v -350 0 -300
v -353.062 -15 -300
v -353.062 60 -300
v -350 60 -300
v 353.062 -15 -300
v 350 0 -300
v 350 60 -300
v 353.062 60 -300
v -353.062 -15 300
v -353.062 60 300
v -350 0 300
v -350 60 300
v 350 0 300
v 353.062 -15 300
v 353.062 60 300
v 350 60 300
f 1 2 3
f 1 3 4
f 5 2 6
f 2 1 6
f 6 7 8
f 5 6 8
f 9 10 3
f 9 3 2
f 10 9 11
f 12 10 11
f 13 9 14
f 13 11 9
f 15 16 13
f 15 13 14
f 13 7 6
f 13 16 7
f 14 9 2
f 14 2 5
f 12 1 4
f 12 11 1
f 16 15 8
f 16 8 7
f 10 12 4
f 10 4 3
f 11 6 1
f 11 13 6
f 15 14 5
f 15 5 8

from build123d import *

# Parameters (mm, degrees)
SALIENTE_EXTRUIR1_DEPTH = 300


with BuildPart() as part:
    # Croquis1 → Saliente-Extruir1 (new, symmetric)
    with BuildSketch(Plane.XY):
        Polygon((0, -15), (0, 0), (-350, 0), (-350, 60), (-353.0625, 60), (-353.0625, -15), align=None)
        Polygon((350, 60), (350, 0), (0, 0), (0, -15), (353.0625, -15), (353.0625, 60), align=None)
    extrude(amount=SALIENTE_EXTRUIR1_DEPTH, both=True)


solid = part.part
